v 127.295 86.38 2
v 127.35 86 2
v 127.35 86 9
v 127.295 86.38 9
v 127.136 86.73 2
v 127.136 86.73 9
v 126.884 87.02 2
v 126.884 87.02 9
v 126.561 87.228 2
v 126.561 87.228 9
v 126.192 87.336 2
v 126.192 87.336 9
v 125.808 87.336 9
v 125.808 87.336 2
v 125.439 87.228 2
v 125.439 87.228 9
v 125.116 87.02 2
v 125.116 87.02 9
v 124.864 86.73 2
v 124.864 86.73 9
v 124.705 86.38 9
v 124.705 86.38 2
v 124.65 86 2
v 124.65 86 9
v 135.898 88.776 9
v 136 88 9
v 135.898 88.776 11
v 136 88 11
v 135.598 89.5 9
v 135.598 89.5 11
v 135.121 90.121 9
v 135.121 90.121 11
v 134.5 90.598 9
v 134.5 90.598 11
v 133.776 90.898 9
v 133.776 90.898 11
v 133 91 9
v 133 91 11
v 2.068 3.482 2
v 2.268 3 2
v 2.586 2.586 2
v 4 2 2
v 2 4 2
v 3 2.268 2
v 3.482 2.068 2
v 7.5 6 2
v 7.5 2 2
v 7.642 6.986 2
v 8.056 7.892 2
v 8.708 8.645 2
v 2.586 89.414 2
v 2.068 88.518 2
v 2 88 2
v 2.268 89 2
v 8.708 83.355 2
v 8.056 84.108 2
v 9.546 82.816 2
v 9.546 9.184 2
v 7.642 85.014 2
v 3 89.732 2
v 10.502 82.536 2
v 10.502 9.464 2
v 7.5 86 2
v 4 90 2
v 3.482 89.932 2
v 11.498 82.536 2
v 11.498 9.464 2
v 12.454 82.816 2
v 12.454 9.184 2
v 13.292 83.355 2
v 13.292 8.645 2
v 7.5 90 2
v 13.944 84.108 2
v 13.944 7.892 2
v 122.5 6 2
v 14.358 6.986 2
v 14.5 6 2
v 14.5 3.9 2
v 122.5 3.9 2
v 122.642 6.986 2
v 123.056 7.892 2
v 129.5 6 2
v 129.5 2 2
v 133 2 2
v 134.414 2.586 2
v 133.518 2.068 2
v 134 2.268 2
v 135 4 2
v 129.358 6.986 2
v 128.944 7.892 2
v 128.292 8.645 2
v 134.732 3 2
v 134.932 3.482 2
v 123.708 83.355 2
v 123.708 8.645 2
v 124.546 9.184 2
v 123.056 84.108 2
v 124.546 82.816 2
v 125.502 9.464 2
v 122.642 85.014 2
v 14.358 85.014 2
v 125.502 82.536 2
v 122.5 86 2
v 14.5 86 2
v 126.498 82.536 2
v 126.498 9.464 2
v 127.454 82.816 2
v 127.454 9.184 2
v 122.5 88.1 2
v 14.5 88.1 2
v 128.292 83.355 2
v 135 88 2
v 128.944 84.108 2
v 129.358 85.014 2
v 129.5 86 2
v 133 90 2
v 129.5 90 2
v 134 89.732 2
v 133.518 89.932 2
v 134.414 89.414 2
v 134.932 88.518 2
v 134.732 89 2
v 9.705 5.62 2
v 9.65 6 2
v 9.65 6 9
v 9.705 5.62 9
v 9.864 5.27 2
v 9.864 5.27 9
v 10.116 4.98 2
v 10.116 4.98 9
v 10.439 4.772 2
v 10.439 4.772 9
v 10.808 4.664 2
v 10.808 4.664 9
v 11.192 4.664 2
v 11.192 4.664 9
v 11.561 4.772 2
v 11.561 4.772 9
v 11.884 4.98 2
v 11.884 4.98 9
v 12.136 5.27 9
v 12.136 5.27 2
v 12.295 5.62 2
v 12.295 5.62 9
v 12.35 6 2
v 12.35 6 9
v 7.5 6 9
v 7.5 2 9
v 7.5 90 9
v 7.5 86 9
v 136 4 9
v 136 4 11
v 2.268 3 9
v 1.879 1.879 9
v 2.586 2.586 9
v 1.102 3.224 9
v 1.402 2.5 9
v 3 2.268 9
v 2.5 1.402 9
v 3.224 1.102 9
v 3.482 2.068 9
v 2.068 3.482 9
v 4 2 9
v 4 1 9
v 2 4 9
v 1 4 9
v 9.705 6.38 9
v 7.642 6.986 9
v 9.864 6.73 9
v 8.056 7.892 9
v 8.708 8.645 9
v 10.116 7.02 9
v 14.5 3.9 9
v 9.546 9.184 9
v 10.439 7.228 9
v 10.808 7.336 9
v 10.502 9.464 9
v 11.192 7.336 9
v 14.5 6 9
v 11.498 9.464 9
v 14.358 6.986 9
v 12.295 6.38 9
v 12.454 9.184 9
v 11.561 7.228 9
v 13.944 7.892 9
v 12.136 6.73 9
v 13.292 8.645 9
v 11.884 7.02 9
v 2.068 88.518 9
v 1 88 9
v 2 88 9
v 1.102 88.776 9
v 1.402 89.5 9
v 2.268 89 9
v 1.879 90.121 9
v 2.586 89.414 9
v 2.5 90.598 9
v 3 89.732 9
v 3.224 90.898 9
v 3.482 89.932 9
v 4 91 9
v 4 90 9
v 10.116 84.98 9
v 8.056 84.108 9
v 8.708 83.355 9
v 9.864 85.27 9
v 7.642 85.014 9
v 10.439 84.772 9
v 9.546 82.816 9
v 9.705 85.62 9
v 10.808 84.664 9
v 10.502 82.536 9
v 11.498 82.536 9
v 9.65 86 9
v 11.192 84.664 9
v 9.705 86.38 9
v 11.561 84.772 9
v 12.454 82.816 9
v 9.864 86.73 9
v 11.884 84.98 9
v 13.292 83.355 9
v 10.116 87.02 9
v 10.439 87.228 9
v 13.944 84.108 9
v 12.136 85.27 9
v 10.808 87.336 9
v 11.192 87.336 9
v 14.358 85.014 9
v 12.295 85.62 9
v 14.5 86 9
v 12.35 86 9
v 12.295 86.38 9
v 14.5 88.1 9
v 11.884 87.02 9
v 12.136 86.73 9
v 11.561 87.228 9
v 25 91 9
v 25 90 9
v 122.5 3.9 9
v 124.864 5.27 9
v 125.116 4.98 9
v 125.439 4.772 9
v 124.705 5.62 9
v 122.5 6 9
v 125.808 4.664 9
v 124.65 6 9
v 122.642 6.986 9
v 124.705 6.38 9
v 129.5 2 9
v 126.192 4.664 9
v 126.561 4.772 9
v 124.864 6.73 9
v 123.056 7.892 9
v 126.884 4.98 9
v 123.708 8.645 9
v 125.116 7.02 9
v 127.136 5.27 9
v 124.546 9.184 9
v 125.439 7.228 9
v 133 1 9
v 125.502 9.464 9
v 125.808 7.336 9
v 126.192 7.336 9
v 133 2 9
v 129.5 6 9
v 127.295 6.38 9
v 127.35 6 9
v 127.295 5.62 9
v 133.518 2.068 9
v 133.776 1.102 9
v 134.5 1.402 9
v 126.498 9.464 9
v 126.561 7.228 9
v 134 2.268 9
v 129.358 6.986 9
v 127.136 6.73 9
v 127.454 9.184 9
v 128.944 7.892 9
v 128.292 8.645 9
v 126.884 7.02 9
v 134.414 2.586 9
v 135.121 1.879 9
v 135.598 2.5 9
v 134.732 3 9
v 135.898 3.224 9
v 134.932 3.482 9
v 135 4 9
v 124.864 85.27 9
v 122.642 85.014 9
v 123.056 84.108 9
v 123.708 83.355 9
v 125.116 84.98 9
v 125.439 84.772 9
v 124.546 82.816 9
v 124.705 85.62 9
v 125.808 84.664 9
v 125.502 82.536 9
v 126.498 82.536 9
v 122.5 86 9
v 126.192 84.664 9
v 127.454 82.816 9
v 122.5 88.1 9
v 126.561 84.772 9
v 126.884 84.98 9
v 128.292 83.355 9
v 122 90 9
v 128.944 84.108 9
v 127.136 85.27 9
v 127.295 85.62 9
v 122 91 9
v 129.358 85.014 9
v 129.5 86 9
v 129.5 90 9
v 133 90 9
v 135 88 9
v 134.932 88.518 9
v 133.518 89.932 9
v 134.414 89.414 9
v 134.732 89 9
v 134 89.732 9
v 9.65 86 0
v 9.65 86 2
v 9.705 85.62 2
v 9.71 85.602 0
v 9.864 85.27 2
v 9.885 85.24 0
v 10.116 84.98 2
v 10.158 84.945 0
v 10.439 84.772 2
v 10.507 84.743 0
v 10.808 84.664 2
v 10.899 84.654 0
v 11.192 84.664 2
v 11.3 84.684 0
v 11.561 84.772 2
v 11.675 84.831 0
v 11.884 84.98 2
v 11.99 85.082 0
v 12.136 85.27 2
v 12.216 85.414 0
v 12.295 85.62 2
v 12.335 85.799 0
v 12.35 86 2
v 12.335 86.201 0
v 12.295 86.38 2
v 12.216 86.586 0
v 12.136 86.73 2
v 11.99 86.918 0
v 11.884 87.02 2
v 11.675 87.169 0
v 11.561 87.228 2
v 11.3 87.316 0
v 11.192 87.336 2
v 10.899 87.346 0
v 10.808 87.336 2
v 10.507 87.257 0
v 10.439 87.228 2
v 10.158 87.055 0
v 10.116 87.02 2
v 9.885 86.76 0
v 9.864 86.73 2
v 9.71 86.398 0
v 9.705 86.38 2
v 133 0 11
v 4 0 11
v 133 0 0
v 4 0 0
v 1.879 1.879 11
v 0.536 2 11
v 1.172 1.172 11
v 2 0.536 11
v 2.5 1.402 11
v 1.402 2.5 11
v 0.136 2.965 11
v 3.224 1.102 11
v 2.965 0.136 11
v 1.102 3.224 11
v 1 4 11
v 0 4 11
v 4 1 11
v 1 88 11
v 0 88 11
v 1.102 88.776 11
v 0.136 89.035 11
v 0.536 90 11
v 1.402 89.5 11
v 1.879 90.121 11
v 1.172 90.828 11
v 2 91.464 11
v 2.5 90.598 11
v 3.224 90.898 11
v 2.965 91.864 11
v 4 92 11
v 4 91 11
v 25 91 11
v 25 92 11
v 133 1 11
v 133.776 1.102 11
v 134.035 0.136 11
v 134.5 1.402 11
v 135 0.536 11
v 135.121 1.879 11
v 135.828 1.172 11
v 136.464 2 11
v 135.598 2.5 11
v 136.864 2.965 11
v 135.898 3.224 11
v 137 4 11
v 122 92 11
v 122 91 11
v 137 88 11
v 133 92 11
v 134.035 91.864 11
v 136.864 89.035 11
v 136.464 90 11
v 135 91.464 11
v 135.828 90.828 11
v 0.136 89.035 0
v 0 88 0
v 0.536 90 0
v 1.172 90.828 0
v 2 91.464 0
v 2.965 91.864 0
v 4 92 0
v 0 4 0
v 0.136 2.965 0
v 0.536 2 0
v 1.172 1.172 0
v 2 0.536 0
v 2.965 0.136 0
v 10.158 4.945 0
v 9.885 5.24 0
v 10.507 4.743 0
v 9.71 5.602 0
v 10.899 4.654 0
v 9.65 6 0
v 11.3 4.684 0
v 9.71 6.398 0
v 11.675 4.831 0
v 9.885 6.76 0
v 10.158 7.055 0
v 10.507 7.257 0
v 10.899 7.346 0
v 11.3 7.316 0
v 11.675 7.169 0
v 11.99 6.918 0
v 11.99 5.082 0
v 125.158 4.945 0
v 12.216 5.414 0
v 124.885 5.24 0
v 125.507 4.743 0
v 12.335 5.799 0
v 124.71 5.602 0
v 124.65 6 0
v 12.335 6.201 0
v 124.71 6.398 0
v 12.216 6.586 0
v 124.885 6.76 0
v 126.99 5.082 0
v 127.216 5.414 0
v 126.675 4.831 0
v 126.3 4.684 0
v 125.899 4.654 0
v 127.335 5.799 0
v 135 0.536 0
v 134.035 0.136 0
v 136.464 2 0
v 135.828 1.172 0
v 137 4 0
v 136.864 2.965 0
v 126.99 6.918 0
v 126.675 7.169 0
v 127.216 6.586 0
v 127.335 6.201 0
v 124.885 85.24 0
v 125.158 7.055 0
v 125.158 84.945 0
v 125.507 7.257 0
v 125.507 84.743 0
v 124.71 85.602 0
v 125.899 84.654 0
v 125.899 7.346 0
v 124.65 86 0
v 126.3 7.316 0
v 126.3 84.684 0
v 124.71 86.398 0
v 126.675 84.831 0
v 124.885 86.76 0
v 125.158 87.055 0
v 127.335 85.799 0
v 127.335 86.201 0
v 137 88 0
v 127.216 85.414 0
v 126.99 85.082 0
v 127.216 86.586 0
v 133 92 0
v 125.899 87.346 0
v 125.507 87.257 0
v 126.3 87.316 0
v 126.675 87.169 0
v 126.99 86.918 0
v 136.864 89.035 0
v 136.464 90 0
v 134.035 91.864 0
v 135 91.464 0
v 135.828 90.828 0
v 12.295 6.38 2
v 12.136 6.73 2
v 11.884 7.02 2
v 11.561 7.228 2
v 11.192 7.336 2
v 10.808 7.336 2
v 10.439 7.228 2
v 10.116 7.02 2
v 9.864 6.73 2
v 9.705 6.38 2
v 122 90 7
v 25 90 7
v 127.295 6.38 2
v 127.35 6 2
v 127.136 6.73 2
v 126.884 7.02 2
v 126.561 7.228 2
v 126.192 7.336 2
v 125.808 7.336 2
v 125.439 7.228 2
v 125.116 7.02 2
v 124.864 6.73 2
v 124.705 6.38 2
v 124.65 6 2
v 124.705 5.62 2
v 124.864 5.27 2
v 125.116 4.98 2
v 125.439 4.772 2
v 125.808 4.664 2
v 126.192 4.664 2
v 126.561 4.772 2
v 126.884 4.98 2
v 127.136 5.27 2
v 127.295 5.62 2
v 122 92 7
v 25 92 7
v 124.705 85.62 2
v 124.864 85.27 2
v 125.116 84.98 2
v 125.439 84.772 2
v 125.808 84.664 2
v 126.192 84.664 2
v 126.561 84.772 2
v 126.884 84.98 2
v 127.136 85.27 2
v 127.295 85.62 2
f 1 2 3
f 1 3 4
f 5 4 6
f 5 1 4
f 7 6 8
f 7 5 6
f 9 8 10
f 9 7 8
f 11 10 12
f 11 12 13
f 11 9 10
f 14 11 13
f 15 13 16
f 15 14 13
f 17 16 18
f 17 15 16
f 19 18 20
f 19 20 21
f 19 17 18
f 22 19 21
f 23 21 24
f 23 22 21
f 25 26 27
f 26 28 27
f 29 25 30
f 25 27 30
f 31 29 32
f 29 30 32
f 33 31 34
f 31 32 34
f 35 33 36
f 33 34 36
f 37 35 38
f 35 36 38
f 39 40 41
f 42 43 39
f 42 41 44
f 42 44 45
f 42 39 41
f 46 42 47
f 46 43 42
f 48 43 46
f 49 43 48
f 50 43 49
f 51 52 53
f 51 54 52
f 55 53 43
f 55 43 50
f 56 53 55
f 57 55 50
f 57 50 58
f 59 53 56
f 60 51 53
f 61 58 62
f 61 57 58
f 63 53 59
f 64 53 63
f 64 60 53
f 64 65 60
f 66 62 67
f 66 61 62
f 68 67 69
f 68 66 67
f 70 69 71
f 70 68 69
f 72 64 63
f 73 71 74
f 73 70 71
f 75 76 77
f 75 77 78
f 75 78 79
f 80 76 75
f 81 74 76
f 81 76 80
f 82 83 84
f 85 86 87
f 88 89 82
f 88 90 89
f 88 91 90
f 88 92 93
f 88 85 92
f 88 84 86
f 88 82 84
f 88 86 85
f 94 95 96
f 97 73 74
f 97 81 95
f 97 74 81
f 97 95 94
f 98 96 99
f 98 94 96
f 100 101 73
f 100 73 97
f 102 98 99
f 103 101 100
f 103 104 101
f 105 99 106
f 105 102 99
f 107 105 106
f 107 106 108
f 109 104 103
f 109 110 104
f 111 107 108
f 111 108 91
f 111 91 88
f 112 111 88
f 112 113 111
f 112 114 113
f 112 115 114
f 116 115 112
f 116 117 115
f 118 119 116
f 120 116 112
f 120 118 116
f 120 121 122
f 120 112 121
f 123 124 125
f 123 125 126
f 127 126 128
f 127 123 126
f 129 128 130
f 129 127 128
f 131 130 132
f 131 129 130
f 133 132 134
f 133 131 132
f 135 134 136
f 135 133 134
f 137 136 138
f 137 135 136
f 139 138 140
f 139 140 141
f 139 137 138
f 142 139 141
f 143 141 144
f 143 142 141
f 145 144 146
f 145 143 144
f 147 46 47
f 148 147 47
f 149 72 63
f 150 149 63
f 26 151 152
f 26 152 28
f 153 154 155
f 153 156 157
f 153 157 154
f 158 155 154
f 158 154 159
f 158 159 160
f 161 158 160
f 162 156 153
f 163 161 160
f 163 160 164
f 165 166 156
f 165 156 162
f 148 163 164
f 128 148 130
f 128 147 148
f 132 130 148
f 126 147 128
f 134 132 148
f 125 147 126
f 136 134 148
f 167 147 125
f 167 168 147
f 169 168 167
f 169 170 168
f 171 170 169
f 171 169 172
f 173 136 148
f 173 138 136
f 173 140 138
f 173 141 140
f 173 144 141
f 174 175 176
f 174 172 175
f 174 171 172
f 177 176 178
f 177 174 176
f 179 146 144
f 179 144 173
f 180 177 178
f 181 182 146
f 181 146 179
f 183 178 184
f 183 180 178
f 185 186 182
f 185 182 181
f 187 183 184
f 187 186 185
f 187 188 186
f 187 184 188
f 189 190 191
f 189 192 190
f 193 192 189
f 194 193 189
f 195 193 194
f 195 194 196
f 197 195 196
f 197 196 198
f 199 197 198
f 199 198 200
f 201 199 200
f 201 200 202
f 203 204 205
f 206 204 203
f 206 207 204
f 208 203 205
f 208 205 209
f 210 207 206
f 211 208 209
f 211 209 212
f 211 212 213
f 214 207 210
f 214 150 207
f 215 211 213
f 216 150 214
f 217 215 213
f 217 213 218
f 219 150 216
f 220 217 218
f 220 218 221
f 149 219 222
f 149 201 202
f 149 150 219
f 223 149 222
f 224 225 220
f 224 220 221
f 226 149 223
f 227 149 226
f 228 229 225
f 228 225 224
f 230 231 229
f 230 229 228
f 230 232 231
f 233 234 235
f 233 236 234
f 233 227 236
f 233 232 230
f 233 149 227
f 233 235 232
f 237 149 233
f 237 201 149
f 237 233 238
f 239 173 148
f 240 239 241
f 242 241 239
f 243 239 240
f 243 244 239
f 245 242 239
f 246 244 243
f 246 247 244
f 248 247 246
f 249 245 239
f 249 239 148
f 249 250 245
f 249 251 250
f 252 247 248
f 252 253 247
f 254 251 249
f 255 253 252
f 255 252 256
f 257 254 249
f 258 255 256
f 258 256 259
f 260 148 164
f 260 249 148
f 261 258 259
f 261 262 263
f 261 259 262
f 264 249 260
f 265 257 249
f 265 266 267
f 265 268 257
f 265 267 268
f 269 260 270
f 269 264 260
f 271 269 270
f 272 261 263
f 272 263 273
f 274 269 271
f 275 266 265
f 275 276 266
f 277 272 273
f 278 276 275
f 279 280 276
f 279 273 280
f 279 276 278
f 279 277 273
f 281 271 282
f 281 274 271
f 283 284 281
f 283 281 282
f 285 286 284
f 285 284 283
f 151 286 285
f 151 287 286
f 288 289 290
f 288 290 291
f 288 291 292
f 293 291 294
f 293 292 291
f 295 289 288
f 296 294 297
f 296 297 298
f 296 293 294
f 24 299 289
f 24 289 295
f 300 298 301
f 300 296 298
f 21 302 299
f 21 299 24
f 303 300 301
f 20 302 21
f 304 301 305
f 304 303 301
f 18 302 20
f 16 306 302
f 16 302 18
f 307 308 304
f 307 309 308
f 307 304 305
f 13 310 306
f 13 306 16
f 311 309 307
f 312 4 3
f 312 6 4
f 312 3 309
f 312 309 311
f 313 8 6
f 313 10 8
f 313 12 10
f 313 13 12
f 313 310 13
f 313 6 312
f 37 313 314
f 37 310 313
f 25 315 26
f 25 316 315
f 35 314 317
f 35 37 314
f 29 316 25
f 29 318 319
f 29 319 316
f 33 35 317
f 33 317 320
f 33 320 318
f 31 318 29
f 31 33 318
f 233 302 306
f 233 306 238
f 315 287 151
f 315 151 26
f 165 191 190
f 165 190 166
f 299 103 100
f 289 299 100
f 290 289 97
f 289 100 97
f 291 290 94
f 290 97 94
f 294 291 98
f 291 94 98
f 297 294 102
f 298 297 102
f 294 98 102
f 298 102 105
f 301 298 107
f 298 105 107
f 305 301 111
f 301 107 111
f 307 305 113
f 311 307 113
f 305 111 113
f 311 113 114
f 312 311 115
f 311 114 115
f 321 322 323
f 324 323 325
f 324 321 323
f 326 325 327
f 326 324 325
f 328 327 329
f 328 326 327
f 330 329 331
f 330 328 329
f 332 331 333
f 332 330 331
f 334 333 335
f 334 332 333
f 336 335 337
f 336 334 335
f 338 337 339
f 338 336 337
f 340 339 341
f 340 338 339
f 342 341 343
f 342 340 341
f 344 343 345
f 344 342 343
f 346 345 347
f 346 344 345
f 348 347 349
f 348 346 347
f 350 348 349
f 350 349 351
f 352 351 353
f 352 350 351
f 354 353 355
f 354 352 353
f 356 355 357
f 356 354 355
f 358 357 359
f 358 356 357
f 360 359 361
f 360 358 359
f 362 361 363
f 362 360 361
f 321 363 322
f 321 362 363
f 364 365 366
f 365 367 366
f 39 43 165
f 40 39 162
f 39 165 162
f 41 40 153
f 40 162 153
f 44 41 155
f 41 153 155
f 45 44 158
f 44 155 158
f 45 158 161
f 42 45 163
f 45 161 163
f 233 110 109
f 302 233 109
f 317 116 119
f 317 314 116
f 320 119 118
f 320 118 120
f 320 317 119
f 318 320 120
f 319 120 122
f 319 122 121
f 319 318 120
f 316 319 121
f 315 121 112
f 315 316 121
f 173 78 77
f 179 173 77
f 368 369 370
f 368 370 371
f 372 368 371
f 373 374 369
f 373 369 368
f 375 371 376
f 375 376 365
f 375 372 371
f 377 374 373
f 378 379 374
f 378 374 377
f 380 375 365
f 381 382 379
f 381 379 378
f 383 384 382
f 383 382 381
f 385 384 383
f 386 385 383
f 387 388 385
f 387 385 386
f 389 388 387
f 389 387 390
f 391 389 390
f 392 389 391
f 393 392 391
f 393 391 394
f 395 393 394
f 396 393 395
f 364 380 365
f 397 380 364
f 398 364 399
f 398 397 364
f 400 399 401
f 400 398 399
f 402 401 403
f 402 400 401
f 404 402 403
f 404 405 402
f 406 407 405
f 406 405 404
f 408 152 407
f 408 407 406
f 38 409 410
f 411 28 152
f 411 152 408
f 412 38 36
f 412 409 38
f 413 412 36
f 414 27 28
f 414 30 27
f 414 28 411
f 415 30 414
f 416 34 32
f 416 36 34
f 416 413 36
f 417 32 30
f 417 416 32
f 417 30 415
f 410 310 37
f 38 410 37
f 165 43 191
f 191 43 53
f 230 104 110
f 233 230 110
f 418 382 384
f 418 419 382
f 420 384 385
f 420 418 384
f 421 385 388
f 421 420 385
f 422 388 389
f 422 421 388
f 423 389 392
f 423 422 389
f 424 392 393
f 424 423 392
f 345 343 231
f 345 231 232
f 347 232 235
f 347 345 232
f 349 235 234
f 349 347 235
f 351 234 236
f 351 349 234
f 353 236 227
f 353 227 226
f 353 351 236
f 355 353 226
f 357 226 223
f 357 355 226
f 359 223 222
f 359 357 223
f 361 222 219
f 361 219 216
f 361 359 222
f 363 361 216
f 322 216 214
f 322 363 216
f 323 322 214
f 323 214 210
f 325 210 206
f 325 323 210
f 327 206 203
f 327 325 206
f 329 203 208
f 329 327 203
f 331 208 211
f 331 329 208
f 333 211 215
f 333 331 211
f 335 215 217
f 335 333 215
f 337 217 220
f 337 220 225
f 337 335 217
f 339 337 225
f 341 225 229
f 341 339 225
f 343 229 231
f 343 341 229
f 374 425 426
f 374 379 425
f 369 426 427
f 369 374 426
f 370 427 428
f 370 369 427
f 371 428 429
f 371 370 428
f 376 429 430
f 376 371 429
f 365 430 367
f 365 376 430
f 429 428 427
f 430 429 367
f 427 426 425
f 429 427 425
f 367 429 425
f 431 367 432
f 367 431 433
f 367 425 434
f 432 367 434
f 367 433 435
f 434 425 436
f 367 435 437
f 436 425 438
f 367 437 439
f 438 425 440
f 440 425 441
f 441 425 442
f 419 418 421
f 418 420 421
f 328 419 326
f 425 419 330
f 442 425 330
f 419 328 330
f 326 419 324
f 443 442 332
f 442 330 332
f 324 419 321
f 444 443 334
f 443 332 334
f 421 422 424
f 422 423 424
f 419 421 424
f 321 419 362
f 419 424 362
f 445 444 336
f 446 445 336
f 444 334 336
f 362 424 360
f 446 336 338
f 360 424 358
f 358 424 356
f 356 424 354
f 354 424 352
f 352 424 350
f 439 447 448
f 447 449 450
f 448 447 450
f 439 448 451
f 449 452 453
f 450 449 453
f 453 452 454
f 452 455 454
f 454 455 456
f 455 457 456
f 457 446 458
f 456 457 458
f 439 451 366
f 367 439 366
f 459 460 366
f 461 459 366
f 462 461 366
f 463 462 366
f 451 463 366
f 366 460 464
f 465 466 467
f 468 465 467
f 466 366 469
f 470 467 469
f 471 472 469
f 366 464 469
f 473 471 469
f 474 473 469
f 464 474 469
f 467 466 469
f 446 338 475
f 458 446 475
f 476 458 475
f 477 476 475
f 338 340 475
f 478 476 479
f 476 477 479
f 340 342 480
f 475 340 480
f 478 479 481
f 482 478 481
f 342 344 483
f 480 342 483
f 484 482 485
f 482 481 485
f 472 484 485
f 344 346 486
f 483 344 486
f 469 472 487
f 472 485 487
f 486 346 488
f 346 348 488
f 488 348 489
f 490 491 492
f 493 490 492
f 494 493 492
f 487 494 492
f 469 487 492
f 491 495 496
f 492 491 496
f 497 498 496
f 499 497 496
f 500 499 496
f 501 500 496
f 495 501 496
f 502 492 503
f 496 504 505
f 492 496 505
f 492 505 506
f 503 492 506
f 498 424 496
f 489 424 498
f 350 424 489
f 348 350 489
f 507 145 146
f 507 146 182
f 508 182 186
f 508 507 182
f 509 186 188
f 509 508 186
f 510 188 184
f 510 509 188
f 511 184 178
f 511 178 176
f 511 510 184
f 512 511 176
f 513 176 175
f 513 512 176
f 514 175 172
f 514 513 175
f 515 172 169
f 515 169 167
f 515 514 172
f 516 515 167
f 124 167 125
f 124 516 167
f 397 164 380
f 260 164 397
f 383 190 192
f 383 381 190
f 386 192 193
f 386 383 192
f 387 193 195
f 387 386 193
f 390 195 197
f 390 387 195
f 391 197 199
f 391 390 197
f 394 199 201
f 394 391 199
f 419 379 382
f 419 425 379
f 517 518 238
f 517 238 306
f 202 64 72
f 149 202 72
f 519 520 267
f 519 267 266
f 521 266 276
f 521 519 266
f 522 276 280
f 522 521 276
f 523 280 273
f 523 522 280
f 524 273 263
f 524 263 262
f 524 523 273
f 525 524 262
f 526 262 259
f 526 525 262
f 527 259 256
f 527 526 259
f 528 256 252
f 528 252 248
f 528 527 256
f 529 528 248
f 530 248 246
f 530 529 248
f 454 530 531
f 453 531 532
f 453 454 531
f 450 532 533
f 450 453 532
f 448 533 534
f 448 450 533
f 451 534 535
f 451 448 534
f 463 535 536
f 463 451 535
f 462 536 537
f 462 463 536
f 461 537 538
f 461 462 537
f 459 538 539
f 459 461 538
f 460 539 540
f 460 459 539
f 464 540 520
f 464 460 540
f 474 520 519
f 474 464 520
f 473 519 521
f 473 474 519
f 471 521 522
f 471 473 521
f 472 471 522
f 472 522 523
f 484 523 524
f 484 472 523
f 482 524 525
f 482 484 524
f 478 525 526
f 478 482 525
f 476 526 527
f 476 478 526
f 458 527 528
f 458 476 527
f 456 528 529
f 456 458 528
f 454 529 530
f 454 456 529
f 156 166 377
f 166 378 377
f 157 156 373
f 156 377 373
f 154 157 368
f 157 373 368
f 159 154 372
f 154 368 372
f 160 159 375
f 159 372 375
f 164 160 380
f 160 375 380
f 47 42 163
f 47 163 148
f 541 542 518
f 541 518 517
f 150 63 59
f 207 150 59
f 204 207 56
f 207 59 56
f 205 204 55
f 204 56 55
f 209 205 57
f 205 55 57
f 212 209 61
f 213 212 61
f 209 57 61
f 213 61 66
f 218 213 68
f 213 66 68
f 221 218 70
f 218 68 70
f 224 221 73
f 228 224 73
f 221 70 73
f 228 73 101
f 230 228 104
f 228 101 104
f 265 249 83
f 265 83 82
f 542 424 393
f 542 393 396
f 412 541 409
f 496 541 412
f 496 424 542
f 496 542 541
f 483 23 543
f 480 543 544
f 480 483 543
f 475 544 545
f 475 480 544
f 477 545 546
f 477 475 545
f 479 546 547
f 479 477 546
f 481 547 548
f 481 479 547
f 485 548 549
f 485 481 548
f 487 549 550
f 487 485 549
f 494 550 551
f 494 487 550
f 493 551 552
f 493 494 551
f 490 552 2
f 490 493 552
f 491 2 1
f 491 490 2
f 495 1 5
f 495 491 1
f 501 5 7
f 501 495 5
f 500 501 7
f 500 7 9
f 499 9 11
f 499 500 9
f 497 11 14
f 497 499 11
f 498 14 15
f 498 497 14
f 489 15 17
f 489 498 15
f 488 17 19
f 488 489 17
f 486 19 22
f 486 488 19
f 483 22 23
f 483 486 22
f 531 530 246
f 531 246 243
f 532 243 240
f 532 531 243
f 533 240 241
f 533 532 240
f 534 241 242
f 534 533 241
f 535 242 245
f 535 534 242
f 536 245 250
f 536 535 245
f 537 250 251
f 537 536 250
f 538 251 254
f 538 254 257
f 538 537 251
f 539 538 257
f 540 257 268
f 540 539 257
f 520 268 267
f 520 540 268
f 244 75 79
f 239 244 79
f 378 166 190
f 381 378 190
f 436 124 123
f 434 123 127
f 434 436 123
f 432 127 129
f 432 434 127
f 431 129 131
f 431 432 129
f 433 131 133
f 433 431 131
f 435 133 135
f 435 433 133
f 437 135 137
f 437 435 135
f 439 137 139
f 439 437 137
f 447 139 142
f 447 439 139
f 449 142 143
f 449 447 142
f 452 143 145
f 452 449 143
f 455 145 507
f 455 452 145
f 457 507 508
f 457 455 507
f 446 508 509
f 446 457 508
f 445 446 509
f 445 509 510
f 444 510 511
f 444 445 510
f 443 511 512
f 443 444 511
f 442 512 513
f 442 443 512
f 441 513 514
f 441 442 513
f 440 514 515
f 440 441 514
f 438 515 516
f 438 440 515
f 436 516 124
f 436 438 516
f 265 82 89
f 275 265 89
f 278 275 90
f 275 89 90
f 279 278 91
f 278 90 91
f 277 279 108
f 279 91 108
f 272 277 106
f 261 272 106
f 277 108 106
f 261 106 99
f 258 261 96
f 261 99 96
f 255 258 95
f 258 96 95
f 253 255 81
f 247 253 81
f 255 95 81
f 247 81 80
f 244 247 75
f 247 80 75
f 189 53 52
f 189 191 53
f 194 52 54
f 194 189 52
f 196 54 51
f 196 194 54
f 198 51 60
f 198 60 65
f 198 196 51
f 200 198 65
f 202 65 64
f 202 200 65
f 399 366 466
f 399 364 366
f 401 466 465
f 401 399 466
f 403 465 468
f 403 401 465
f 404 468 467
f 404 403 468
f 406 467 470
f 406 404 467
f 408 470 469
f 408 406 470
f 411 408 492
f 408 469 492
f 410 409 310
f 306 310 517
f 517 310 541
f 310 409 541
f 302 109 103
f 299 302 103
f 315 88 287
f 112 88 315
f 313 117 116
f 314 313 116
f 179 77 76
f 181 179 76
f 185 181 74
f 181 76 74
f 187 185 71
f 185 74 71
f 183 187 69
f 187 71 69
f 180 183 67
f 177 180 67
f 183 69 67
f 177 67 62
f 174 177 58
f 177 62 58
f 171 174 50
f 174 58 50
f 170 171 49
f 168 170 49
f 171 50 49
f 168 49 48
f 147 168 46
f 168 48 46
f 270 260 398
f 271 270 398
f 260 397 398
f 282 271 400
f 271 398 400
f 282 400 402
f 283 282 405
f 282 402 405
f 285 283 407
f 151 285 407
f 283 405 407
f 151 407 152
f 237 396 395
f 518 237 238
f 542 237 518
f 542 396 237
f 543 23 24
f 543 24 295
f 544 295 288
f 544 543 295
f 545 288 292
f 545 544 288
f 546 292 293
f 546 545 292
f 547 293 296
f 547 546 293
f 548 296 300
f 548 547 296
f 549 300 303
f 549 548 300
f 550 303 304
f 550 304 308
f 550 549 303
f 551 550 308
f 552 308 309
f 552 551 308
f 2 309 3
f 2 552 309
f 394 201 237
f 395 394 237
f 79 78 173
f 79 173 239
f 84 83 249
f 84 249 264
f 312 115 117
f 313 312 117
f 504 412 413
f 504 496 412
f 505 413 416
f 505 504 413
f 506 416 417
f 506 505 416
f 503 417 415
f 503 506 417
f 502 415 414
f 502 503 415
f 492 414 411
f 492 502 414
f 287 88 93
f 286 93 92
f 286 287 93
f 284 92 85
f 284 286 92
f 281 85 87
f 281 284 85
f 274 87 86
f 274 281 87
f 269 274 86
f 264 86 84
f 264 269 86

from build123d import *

# Parameters (mm, degrees)
SKETCH1_W           = 137
SKETCH1_H           = 92
BOSS_EXTRUDE1_DEPTH = 2
SKETCH2_W           = 137
SKETCH2_H           = 92
SKETCH2_W_2         = 133
SKETCH2_H_2         = 88
BOSS_EXTRUDE2_DEPTH = 7
SKETCH3_W           = 137
SKETCH3_H           = 92
SKETCH3_W_2         = 135
SKETCH3_H_2         = 90
BOSS_EXTRUDE3_DEPTH = 2
SKETCH4_R           = 1.35
BOSS_EXTRUDE4_DEPTH = 7
SKETCH8_W           = 108
SKETCH8_H           = 1.9
BOSS_EXTRUDE6_DEPTH = 7
FILLET1_R           = 2
FILLET2_R           = 3
FILLET3_R           = 4
SKETCH11_W          = 108
SKETCH11_H          = 1.9
BOSS_EXTRUDE7_DEPTH = 7
SKETCH12_W          = 97
SKETCH12_H          = 4
CUT_EXTRUDE3_DEPTH  = 2
CUT_EXTRUDE4_START  = -10
SKETCH13_R          = 1.35
CUT_EXTRUDE4_DEPTH  = 10


with BuildPart() as part:
    # Sketch1 → Boss-Extrude1 (new body)
    with BuildSketch(Plane.XY):
        with Locations((68.5, 46)):
            Rectangle(SKETCH1_W, SKETCH1_H)
    extrude(amount=BOSS_EXTRUDE1_DEPTH)

    # Sketch2 → Boss-Extrude2 (add)
    with BuildSketch(Plane.XY.offset(2)):
        with Locations((68.5, 46)):
            Rectangle(SKETCH2_W, SKETCH2_H)
        with Locations((68.5, 46)):
            Rectangle(SKETCH2_W_2, SKETCH2_H_2, mode=Mode.SUBTRACT)
    extrude(amount=BOSS_EXTRUDE2_DEPTH)

    # Sketch3 → Boss-Extrude3 (add)
    with BuildSketch(Plane.XY.offset(9)):
        with Locations((68.5, 46)):
            Rectangle(SKETCH3_W, SKETCH3_H)
        with Locations((68.5, 46)):
            Rectangle(SKETCH3_W_2, SKETCH3_H_2, mode=Mode.SUBTRACT)
    extrude(amount=BOSS_EXTRUDE3_DEPTH)

    # Sketch4 → Boss-Extrude4 (add)
    # profile 1 of 4: a face of its own
    with BuildSketch(Plane.XY.offset(2)):
        with BuildLine():
            Line((7.5, 6), (7.5, 2))
            Line((7.5, 2), (14.5, 2))
            Line((14.5, 2), (14.5, 6))
            ThreePointArc((14.5, 6), (11, 9.5), (7.5, 6))
        make_face()
        with Locations((11, 6)):
            Circle(SKETCH4_R, mode=Mode.SUBTRACT)
    # profile 2 of 4: a face of its own
    with BuildSketch(Plane.XY.offset(2)):
        with BuildLine():
            Line((122.5, 6), (122.5, 2))
            Line((122.5, 2), (129.5, 2))
            Line((129.5, 2), (129.5, 6))
            ThreePointArc((129.5, 6), (126, 9.5), (122.5, 6))
        make_face()
        with Locations((126, 6)):
            Circle(SKETCH4_R, mode=Mode.SUBTRACT)
    # profile 3 of 4: a face of its own
    with BuildSketch(Plane.XY.offset(2)):
        with BuildLine():
            Line((129.5, 86), (129.5, 90))
            Line((129.5, 90), (122.5, 90))
            Line((122.5, 90), (122.5, 86))
            ThreePointArc((122.5, 86), (126, 82.5), (129.5, 86))
        make_face()
        with Locations((126, 86)):
            Circle(SKETCH4_R, mode=Mode.SUBTRACT)
    # profile 4 of 4: a face of its own
    with BuildSketch(Plane.XY.offset(2)):
        with BuildLine():
            Line((14.5, 86), (14.5, 90))
            Line((14.5, 90), (7.5, 90))
            Line((7.5, 90), (7.5, 86))
            ThreePointArc((7.5, 86), (11, 82.5), (14.5, 86))
        make_face()
        with Locations((11, 86)):
            Circle(SKETCH4_R, mode=Mode.SUBTRACT)
    extrude(amount=BOSS_EXTRUDE4_DEPTH)

    # Sketch8 → Boss-Extrude6 (add)
    with BuildSketch(Plane.XY.offset(2)):
        with Locations((68.5, 2.95)):
            Rectangle(SKETCH8_W, SKETCH8_H)
    extrude(amount=BOSS_EXTRUDE6_DEPTH)

    # Fillet1
    fillet1_edges = [part.edges().sort_by_distance(p)[0] for p in [
        (2, 2, 5.5),
        (135, 2, 5.5),
        (135, 90, 5.5),
        (2, 90, 5.5),
    ]]
    fillet(fillet1_edges, radius=FILLET1_R)

    # Fillet2
    fillet2_edges = [part.edges().sort_by_distance(p)[0] for p in [
        (1, 1, 10),
        (136, 1, 10),
        (136, 91, 10),
        (1, 91, 10),
    ]]
    fillet(fillet2_edges, radius=FILLET2_R)

    # Fillet3
    fillet3_edges = [part.edges().sort_by_distance(p)[0] for p in [
        (0, 92, 5.5),
        (137, 92, 5.5),
        (137, 0, 5.5),
        (0, 0, 5.5),
    ]]
    fillet(fillet3_edges, radius=FILLET3_R)

    # Sketch11 → Boss-Extrude7 (add)
    with BuildSketch(Plane.XY.offset(2)):
        with Locations((68.5, 89.05)):
            Rectangle(SKETCH11_W, SKETCH11_H)
    extrude(amount=BOSS_EXTRUDE7_DEPTH)

    # Sketch12 → Cut-Extrude3 (cut)
    with BuildSketch(Plane(origin=(0, 92, 0), x_dir=(1, 0, 0), z_dir=(0, 1, 0))):
        with Locations((73.5, -9)):
            Rectangle(SKETCH12_W, SKETCH12_H)
    extrude(amount=-CUT_EXTRUDE3_DEPTH, mode=Mode.SUBTRACT)

    # Sketch13 → Cut-Extrude4 (cut)
    with BuildSketch(Plane.XY.offset(9).offset(CUT_EXTRUDE4_START)):
        with Locations(Location((11, 86, 0), (0, 0, 180))):
            Circle(SKETCH13_R)
        with Locations(Location((11, 6, 0), (0, 0, 180))):
            Circle(SKETCH13_R)
        with Locations(Location((126, 6, 0), (0, 0, 180))):
            Circle(SKETCH13_R)
        with Locations(Location((126, 86, 0), (0, 0, 180))):
            Circle(SKETCH13_R)
    extrude(amount=CUT_EXTRUDE4_DEPTH, mode=Mode.SUBTRACT)


solid = part.part
